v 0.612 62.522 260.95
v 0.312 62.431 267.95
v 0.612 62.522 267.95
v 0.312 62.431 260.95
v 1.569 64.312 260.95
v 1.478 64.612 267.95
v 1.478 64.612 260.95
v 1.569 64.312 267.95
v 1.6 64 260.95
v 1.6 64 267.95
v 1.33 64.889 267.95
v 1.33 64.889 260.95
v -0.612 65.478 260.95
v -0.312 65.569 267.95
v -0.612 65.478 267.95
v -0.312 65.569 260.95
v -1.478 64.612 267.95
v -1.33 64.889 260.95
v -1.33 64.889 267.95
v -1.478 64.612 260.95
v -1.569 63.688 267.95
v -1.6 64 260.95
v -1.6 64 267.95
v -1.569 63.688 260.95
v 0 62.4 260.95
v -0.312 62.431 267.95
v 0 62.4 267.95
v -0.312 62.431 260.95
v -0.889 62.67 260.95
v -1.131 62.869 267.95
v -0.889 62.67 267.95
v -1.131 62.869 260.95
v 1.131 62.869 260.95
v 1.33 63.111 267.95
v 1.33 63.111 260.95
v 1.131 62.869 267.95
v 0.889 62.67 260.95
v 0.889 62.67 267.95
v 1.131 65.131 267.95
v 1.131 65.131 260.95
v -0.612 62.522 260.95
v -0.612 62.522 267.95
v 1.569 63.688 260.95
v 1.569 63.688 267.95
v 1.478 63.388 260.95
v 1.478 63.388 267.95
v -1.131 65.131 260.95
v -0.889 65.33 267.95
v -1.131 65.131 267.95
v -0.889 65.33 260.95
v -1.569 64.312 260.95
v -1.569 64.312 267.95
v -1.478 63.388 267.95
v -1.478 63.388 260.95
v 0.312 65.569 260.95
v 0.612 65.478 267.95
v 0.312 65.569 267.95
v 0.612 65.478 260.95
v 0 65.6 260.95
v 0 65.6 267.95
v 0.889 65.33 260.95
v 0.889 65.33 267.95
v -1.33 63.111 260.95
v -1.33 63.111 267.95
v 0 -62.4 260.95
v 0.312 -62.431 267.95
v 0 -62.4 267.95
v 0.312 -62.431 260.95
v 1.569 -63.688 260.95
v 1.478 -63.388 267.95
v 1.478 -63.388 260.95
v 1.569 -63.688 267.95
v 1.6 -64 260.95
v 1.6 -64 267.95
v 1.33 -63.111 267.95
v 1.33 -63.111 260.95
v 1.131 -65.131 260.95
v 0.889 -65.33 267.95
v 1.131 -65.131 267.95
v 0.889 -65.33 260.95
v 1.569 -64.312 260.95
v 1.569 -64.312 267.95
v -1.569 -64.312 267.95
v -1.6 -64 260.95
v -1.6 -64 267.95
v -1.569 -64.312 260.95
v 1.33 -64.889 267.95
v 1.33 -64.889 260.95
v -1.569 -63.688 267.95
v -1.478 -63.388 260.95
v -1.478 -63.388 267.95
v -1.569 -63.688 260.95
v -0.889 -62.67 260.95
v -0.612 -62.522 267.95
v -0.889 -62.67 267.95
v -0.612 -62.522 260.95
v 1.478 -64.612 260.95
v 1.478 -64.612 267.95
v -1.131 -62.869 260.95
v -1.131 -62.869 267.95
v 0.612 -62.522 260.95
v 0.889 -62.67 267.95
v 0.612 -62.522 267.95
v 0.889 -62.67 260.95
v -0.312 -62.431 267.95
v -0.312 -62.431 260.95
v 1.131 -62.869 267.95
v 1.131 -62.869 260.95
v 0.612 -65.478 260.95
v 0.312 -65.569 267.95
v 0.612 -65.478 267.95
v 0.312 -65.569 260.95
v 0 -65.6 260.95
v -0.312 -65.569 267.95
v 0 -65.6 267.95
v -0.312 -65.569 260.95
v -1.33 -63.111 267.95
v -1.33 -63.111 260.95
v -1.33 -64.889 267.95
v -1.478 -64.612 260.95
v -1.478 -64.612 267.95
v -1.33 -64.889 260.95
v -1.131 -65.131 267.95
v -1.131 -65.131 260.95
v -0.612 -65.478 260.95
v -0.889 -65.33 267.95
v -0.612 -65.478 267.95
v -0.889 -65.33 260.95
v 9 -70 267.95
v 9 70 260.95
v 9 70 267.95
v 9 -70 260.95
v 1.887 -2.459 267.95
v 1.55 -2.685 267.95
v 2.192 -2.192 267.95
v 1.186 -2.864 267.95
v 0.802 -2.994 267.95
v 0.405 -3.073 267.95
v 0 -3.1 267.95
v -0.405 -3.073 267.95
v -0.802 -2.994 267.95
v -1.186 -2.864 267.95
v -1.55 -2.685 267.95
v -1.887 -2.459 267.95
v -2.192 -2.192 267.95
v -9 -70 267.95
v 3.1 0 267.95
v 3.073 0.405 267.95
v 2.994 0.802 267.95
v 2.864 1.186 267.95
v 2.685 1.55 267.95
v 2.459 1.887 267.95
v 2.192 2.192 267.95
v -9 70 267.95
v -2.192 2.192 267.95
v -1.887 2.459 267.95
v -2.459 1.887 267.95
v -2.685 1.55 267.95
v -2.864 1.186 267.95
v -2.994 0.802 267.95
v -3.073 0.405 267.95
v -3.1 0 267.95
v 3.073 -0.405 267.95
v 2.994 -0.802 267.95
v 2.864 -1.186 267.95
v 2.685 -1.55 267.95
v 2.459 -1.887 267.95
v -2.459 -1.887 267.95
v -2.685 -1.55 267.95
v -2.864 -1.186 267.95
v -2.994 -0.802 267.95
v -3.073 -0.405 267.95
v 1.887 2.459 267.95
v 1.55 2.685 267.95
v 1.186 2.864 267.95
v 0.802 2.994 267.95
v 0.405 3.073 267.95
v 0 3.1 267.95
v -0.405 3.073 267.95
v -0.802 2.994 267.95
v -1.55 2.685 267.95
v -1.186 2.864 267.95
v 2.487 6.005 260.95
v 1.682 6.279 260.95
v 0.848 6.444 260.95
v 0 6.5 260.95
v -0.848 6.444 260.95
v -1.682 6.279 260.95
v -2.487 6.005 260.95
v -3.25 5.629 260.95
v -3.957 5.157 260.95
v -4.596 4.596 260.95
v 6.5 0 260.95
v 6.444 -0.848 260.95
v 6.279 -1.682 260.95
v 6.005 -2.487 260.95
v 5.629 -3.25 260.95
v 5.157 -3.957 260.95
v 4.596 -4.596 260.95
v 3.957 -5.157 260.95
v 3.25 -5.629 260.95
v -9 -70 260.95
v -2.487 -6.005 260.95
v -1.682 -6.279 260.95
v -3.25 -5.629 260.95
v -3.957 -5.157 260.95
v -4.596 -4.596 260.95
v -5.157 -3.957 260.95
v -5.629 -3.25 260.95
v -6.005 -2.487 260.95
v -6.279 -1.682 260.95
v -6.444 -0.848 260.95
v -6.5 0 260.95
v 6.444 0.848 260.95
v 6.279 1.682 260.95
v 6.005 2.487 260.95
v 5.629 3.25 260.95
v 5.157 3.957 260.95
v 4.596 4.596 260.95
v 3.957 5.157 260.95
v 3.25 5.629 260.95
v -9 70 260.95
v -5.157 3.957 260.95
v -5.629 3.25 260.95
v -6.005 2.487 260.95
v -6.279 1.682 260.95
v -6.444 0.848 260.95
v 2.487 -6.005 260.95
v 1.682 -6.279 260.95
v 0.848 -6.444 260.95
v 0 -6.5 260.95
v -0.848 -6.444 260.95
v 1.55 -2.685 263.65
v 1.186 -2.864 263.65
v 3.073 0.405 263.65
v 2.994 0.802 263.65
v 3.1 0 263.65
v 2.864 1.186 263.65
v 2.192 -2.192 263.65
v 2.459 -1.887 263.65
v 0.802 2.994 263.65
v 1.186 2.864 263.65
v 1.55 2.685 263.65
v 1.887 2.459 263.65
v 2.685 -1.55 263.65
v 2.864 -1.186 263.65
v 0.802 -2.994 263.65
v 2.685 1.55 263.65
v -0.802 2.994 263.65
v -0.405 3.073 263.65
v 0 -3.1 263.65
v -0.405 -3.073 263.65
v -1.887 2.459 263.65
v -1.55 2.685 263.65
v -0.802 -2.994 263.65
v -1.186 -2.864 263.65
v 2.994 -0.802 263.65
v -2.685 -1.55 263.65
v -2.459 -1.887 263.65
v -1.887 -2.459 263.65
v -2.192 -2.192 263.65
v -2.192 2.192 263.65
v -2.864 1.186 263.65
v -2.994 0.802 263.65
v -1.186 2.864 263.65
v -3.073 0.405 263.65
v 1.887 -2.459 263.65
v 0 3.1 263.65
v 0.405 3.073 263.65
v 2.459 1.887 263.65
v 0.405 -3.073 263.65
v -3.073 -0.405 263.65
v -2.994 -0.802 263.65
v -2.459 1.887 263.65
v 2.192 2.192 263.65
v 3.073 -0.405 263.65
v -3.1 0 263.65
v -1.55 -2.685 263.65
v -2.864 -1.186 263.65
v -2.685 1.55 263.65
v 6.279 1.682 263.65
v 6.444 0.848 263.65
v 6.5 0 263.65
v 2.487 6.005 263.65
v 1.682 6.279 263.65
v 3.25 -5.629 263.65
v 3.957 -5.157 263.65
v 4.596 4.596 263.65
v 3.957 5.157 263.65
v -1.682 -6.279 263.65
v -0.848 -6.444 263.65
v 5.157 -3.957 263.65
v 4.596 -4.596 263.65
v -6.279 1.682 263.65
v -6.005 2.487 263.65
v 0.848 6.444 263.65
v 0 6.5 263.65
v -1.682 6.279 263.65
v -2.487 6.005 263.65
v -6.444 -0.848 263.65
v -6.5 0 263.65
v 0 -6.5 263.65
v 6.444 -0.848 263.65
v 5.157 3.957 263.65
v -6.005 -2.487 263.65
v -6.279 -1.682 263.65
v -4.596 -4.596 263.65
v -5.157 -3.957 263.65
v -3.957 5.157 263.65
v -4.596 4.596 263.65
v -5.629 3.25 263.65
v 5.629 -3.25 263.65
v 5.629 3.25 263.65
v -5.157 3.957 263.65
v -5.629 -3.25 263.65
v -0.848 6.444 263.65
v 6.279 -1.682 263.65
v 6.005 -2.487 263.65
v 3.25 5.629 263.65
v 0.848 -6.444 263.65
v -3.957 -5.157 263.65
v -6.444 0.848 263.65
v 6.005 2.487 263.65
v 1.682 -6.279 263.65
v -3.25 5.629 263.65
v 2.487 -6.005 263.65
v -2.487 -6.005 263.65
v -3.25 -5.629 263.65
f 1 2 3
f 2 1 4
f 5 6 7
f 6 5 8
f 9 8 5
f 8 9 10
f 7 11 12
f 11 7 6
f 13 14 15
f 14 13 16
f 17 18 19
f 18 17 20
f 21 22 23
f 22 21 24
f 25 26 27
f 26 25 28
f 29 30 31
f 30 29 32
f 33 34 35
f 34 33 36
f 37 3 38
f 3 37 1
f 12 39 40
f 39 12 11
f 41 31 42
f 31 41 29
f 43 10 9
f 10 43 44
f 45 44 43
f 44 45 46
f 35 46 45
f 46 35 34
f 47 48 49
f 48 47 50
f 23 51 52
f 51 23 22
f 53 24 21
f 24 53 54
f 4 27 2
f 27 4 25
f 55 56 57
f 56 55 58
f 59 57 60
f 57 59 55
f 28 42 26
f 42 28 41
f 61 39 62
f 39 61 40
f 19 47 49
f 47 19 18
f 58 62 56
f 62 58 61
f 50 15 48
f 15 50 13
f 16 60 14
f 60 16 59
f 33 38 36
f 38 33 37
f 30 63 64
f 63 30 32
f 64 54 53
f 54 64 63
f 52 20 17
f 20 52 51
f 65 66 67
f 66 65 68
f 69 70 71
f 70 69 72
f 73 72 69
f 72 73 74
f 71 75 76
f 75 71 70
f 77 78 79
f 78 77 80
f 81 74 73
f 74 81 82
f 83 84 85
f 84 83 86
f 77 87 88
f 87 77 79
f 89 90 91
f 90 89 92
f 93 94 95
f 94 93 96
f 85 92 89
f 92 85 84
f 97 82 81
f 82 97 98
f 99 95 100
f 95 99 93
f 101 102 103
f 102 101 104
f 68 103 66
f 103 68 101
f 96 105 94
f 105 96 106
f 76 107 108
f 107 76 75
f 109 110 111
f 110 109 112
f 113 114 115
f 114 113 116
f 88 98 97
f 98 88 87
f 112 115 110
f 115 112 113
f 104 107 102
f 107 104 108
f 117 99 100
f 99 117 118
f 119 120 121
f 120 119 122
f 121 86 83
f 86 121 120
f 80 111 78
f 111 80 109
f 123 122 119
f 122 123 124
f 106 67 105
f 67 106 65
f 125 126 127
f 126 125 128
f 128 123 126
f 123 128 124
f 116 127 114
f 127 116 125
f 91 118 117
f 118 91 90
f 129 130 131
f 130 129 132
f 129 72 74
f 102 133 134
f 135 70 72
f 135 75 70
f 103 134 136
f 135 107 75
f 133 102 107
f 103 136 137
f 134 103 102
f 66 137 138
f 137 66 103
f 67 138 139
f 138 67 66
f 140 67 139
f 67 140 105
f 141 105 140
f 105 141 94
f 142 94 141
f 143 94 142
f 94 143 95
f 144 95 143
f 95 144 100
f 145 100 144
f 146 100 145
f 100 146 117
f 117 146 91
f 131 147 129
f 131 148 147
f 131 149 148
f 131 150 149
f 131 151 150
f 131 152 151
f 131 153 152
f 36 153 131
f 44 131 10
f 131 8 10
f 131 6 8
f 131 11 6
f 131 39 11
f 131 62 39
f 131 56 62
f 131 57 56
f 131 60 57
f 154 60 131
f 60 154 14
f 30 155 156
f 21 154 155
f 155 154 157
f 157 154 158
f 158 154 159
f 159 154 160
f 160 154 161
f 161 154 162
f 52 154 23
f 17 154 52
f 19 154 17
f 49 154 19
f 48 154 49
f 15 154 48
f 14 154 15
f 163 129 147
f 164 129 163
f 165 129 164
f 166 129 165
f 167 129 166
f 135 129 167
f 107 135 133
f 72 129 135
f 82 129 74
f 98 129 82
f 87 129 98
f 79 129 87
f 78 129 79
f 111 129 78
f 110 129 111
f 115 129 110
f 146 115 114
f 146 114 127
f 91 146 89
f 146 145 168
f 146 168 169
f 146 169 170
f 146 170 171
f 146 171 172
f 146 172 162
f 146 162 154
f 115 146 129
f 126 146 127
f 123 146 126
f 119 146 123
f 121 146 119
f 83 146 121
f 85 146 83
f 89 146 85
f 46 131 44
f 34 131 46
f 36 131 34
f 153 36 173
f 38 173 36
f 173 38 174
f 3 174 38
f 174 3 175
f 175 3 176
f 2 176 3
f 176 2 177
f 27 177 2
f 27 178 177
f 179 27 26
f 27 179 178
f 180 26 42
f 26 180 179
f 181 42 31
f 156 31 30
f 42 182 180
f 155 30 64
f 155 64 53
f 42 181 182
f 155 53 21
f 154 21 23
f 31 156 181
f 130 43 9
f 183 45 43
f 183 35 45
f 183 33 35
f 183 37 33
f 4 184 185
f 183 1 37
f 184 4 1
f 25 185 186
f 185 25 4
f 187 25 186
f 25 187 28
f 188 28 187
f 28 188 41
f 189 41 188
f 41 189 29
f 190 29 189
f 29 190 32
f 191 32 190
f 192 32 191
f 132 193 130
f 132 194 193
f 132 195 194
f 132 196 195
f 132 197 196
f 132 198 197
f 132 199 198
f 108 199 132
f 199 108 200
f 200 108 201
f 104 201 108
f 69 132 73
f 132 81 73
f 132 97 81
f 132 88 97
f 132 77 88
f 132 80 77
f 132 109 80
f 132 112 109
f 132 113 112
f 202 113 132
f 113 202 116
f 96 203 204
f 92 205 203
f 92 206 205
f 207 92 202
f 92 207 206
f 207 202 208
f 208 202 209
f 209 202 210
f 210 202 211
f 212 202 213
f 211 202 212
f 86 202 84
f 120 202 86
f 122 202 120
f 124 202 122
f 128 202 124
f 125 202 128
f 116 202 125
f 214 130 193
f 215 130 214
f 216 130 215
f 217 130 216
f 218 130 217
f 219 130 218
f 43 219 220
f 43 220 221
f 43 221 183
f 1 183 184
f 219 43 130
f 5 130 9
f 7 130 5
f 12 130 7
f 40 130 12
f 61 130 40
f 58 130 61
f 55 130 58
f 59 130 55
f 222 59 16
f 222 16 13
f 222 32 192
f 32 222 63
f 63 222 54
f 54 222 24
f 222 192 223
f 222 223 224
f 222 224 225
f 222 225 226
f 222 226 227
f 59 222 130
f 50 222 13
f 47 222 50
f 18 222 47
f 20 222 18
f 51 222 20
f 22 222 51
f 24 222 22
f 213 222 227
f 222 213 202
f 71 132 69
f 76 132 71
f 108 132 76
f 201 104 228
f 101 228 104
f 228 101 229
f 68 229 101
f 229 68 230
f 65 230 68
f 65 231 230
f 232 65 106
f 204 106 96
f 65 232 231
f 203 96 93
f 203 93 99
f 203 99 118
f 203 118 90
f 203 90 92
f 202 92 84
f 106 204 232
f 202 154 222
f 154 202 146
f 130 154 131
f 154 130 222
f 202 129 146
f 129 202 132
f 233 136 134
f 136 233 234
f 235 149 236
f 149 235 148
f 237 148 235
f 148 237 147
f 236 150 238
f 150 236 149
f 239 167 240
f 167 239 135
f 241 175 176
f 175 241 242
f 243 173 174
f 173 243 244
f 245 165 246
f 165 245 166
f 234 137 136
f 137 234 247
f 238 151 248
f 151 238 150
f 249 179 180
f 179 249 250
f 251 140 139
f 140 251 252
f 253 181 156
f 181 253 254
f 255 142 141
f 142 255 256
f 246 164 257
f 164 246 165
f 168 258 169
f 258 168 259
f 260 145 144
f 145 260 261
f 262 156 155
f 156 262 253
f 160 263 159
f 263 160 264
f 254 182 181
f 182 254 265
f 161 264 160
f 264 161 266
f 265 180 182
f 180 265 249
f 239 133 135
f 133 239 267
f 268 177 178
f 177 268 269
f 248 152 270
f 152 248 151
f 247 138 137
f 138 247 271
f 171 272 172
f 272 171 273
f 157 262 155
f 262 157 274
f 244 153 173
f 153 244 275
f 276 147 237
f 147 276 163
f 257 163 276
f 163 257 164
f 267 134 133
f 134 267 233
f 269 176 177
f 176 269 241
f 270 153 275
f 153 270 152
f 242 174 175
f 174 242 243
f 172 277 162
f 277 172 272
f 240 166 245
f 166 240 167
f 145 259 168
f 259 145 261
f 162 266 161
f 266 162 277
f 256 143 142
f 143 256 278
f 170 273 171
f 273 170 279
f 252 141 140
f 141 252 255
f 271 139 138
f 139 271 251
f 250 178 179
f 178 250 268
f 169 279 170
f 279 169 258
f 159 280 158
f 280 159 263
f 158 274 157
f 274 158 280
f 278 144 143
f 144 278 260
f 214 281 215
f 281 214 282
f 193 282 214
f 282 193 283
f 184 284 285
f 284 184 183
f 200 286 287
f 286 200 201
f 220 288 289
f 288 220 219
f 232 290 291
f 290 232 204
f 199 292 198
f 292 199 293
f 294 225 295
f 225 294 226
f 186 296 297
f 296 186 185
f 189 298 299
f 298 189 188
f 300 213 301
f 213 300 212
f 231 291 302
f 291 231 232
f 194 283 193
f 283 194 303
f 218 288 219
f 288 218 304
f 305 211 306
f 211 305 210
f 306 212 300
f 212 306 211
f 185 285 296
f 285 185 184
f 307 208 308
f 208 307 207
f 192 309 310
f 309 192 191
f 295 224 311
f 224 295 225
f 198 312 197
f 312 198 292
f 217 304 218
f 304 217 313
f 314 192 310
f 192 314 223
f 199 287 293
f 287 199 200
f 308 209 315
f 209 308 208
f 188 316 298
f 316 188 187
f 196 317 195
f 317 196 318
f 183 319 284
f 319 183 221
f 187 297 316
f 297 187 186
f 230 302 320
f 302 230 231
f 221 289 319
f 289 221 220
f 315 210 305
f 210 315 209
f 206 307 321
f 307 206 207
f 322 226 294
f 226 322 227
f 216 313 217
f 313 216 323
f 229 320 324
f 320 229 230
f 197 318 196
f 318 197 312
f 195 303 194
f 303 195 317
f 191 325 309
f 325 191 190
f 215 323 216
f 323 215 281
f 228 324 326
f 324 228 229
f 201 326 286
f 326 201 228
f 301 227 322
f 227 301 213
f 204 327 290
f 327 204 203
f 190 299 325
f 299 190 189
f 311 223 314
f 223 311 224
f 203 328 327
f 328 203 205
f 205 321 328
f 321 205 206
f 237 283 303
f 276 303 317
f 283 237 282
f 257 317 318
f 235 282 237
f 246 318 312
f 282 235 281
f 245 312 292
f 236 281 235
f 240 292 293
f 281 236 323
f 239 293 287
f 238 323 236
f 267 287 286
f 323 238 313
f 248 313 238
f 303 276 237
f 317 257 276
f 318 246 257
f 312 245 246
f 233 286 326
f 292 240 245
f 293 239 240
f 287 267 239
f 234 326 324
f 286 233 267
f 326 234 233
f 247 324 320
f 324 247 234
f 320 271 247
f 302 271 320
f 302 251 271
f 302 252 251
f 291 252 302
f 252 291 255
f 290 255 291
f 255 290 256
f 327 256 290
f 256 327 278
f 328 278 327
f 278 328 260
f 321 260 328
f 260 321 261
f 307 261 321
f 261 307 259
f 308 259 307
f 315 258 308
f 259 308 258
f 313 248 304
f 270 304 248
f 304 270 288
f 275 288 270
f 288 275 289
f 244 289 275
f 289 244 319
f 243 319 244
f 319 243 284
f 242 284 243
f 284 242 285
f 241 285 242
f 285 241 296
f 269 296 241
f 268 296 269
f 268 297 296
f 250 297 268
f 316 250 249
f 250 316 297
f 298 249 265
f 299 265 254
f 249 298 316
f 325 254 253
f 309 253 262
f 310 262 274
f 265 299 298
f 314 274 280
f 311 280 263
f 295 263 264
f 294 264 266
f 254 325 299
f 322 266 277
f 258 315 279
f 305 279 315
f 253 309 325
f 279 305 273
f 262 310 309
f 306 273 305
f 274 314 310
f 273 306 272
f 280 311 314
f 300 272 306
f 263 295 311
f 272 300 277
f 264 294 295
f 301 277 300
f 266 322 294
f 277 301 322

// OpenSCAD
// top_cap_v3_1 — v3 双面屏顶部薄压条 (与 build_stl.py 同参, 2026-07-22 终版)。
// 装配系 Z 260.95..267.95 (底面压屏顶); 平躺打印零支撑。
// 轴 Φ6.2 通 + Φ13×2.7 底面头窝 (M6×20 平头, 先装后压屏); 2×Φ3.2 @ (0,±64) M3×12。

blk_x=9; blk_y=70; z0=260.95; z1=267.95;
difference(){
  translate([-blk_x,-blk_y,z0]) cube([2*blk_x,2*blk_y,z1-z0]);
  translate([0,0,z0-1]) cylinder(h=z1-z0+2, d=6.2, $fn=48);        // 轴通孔
  translate([0,0,z0-1]) cylinder(h=2.7+1, d=13, $fn=48);           // 底面头窝
  for(y=[64,-64]) translate([0,y,z0-1]) cylinder(h=z1-z0+2, d=3.2, $fn=32);  // 屏顶孔
}
